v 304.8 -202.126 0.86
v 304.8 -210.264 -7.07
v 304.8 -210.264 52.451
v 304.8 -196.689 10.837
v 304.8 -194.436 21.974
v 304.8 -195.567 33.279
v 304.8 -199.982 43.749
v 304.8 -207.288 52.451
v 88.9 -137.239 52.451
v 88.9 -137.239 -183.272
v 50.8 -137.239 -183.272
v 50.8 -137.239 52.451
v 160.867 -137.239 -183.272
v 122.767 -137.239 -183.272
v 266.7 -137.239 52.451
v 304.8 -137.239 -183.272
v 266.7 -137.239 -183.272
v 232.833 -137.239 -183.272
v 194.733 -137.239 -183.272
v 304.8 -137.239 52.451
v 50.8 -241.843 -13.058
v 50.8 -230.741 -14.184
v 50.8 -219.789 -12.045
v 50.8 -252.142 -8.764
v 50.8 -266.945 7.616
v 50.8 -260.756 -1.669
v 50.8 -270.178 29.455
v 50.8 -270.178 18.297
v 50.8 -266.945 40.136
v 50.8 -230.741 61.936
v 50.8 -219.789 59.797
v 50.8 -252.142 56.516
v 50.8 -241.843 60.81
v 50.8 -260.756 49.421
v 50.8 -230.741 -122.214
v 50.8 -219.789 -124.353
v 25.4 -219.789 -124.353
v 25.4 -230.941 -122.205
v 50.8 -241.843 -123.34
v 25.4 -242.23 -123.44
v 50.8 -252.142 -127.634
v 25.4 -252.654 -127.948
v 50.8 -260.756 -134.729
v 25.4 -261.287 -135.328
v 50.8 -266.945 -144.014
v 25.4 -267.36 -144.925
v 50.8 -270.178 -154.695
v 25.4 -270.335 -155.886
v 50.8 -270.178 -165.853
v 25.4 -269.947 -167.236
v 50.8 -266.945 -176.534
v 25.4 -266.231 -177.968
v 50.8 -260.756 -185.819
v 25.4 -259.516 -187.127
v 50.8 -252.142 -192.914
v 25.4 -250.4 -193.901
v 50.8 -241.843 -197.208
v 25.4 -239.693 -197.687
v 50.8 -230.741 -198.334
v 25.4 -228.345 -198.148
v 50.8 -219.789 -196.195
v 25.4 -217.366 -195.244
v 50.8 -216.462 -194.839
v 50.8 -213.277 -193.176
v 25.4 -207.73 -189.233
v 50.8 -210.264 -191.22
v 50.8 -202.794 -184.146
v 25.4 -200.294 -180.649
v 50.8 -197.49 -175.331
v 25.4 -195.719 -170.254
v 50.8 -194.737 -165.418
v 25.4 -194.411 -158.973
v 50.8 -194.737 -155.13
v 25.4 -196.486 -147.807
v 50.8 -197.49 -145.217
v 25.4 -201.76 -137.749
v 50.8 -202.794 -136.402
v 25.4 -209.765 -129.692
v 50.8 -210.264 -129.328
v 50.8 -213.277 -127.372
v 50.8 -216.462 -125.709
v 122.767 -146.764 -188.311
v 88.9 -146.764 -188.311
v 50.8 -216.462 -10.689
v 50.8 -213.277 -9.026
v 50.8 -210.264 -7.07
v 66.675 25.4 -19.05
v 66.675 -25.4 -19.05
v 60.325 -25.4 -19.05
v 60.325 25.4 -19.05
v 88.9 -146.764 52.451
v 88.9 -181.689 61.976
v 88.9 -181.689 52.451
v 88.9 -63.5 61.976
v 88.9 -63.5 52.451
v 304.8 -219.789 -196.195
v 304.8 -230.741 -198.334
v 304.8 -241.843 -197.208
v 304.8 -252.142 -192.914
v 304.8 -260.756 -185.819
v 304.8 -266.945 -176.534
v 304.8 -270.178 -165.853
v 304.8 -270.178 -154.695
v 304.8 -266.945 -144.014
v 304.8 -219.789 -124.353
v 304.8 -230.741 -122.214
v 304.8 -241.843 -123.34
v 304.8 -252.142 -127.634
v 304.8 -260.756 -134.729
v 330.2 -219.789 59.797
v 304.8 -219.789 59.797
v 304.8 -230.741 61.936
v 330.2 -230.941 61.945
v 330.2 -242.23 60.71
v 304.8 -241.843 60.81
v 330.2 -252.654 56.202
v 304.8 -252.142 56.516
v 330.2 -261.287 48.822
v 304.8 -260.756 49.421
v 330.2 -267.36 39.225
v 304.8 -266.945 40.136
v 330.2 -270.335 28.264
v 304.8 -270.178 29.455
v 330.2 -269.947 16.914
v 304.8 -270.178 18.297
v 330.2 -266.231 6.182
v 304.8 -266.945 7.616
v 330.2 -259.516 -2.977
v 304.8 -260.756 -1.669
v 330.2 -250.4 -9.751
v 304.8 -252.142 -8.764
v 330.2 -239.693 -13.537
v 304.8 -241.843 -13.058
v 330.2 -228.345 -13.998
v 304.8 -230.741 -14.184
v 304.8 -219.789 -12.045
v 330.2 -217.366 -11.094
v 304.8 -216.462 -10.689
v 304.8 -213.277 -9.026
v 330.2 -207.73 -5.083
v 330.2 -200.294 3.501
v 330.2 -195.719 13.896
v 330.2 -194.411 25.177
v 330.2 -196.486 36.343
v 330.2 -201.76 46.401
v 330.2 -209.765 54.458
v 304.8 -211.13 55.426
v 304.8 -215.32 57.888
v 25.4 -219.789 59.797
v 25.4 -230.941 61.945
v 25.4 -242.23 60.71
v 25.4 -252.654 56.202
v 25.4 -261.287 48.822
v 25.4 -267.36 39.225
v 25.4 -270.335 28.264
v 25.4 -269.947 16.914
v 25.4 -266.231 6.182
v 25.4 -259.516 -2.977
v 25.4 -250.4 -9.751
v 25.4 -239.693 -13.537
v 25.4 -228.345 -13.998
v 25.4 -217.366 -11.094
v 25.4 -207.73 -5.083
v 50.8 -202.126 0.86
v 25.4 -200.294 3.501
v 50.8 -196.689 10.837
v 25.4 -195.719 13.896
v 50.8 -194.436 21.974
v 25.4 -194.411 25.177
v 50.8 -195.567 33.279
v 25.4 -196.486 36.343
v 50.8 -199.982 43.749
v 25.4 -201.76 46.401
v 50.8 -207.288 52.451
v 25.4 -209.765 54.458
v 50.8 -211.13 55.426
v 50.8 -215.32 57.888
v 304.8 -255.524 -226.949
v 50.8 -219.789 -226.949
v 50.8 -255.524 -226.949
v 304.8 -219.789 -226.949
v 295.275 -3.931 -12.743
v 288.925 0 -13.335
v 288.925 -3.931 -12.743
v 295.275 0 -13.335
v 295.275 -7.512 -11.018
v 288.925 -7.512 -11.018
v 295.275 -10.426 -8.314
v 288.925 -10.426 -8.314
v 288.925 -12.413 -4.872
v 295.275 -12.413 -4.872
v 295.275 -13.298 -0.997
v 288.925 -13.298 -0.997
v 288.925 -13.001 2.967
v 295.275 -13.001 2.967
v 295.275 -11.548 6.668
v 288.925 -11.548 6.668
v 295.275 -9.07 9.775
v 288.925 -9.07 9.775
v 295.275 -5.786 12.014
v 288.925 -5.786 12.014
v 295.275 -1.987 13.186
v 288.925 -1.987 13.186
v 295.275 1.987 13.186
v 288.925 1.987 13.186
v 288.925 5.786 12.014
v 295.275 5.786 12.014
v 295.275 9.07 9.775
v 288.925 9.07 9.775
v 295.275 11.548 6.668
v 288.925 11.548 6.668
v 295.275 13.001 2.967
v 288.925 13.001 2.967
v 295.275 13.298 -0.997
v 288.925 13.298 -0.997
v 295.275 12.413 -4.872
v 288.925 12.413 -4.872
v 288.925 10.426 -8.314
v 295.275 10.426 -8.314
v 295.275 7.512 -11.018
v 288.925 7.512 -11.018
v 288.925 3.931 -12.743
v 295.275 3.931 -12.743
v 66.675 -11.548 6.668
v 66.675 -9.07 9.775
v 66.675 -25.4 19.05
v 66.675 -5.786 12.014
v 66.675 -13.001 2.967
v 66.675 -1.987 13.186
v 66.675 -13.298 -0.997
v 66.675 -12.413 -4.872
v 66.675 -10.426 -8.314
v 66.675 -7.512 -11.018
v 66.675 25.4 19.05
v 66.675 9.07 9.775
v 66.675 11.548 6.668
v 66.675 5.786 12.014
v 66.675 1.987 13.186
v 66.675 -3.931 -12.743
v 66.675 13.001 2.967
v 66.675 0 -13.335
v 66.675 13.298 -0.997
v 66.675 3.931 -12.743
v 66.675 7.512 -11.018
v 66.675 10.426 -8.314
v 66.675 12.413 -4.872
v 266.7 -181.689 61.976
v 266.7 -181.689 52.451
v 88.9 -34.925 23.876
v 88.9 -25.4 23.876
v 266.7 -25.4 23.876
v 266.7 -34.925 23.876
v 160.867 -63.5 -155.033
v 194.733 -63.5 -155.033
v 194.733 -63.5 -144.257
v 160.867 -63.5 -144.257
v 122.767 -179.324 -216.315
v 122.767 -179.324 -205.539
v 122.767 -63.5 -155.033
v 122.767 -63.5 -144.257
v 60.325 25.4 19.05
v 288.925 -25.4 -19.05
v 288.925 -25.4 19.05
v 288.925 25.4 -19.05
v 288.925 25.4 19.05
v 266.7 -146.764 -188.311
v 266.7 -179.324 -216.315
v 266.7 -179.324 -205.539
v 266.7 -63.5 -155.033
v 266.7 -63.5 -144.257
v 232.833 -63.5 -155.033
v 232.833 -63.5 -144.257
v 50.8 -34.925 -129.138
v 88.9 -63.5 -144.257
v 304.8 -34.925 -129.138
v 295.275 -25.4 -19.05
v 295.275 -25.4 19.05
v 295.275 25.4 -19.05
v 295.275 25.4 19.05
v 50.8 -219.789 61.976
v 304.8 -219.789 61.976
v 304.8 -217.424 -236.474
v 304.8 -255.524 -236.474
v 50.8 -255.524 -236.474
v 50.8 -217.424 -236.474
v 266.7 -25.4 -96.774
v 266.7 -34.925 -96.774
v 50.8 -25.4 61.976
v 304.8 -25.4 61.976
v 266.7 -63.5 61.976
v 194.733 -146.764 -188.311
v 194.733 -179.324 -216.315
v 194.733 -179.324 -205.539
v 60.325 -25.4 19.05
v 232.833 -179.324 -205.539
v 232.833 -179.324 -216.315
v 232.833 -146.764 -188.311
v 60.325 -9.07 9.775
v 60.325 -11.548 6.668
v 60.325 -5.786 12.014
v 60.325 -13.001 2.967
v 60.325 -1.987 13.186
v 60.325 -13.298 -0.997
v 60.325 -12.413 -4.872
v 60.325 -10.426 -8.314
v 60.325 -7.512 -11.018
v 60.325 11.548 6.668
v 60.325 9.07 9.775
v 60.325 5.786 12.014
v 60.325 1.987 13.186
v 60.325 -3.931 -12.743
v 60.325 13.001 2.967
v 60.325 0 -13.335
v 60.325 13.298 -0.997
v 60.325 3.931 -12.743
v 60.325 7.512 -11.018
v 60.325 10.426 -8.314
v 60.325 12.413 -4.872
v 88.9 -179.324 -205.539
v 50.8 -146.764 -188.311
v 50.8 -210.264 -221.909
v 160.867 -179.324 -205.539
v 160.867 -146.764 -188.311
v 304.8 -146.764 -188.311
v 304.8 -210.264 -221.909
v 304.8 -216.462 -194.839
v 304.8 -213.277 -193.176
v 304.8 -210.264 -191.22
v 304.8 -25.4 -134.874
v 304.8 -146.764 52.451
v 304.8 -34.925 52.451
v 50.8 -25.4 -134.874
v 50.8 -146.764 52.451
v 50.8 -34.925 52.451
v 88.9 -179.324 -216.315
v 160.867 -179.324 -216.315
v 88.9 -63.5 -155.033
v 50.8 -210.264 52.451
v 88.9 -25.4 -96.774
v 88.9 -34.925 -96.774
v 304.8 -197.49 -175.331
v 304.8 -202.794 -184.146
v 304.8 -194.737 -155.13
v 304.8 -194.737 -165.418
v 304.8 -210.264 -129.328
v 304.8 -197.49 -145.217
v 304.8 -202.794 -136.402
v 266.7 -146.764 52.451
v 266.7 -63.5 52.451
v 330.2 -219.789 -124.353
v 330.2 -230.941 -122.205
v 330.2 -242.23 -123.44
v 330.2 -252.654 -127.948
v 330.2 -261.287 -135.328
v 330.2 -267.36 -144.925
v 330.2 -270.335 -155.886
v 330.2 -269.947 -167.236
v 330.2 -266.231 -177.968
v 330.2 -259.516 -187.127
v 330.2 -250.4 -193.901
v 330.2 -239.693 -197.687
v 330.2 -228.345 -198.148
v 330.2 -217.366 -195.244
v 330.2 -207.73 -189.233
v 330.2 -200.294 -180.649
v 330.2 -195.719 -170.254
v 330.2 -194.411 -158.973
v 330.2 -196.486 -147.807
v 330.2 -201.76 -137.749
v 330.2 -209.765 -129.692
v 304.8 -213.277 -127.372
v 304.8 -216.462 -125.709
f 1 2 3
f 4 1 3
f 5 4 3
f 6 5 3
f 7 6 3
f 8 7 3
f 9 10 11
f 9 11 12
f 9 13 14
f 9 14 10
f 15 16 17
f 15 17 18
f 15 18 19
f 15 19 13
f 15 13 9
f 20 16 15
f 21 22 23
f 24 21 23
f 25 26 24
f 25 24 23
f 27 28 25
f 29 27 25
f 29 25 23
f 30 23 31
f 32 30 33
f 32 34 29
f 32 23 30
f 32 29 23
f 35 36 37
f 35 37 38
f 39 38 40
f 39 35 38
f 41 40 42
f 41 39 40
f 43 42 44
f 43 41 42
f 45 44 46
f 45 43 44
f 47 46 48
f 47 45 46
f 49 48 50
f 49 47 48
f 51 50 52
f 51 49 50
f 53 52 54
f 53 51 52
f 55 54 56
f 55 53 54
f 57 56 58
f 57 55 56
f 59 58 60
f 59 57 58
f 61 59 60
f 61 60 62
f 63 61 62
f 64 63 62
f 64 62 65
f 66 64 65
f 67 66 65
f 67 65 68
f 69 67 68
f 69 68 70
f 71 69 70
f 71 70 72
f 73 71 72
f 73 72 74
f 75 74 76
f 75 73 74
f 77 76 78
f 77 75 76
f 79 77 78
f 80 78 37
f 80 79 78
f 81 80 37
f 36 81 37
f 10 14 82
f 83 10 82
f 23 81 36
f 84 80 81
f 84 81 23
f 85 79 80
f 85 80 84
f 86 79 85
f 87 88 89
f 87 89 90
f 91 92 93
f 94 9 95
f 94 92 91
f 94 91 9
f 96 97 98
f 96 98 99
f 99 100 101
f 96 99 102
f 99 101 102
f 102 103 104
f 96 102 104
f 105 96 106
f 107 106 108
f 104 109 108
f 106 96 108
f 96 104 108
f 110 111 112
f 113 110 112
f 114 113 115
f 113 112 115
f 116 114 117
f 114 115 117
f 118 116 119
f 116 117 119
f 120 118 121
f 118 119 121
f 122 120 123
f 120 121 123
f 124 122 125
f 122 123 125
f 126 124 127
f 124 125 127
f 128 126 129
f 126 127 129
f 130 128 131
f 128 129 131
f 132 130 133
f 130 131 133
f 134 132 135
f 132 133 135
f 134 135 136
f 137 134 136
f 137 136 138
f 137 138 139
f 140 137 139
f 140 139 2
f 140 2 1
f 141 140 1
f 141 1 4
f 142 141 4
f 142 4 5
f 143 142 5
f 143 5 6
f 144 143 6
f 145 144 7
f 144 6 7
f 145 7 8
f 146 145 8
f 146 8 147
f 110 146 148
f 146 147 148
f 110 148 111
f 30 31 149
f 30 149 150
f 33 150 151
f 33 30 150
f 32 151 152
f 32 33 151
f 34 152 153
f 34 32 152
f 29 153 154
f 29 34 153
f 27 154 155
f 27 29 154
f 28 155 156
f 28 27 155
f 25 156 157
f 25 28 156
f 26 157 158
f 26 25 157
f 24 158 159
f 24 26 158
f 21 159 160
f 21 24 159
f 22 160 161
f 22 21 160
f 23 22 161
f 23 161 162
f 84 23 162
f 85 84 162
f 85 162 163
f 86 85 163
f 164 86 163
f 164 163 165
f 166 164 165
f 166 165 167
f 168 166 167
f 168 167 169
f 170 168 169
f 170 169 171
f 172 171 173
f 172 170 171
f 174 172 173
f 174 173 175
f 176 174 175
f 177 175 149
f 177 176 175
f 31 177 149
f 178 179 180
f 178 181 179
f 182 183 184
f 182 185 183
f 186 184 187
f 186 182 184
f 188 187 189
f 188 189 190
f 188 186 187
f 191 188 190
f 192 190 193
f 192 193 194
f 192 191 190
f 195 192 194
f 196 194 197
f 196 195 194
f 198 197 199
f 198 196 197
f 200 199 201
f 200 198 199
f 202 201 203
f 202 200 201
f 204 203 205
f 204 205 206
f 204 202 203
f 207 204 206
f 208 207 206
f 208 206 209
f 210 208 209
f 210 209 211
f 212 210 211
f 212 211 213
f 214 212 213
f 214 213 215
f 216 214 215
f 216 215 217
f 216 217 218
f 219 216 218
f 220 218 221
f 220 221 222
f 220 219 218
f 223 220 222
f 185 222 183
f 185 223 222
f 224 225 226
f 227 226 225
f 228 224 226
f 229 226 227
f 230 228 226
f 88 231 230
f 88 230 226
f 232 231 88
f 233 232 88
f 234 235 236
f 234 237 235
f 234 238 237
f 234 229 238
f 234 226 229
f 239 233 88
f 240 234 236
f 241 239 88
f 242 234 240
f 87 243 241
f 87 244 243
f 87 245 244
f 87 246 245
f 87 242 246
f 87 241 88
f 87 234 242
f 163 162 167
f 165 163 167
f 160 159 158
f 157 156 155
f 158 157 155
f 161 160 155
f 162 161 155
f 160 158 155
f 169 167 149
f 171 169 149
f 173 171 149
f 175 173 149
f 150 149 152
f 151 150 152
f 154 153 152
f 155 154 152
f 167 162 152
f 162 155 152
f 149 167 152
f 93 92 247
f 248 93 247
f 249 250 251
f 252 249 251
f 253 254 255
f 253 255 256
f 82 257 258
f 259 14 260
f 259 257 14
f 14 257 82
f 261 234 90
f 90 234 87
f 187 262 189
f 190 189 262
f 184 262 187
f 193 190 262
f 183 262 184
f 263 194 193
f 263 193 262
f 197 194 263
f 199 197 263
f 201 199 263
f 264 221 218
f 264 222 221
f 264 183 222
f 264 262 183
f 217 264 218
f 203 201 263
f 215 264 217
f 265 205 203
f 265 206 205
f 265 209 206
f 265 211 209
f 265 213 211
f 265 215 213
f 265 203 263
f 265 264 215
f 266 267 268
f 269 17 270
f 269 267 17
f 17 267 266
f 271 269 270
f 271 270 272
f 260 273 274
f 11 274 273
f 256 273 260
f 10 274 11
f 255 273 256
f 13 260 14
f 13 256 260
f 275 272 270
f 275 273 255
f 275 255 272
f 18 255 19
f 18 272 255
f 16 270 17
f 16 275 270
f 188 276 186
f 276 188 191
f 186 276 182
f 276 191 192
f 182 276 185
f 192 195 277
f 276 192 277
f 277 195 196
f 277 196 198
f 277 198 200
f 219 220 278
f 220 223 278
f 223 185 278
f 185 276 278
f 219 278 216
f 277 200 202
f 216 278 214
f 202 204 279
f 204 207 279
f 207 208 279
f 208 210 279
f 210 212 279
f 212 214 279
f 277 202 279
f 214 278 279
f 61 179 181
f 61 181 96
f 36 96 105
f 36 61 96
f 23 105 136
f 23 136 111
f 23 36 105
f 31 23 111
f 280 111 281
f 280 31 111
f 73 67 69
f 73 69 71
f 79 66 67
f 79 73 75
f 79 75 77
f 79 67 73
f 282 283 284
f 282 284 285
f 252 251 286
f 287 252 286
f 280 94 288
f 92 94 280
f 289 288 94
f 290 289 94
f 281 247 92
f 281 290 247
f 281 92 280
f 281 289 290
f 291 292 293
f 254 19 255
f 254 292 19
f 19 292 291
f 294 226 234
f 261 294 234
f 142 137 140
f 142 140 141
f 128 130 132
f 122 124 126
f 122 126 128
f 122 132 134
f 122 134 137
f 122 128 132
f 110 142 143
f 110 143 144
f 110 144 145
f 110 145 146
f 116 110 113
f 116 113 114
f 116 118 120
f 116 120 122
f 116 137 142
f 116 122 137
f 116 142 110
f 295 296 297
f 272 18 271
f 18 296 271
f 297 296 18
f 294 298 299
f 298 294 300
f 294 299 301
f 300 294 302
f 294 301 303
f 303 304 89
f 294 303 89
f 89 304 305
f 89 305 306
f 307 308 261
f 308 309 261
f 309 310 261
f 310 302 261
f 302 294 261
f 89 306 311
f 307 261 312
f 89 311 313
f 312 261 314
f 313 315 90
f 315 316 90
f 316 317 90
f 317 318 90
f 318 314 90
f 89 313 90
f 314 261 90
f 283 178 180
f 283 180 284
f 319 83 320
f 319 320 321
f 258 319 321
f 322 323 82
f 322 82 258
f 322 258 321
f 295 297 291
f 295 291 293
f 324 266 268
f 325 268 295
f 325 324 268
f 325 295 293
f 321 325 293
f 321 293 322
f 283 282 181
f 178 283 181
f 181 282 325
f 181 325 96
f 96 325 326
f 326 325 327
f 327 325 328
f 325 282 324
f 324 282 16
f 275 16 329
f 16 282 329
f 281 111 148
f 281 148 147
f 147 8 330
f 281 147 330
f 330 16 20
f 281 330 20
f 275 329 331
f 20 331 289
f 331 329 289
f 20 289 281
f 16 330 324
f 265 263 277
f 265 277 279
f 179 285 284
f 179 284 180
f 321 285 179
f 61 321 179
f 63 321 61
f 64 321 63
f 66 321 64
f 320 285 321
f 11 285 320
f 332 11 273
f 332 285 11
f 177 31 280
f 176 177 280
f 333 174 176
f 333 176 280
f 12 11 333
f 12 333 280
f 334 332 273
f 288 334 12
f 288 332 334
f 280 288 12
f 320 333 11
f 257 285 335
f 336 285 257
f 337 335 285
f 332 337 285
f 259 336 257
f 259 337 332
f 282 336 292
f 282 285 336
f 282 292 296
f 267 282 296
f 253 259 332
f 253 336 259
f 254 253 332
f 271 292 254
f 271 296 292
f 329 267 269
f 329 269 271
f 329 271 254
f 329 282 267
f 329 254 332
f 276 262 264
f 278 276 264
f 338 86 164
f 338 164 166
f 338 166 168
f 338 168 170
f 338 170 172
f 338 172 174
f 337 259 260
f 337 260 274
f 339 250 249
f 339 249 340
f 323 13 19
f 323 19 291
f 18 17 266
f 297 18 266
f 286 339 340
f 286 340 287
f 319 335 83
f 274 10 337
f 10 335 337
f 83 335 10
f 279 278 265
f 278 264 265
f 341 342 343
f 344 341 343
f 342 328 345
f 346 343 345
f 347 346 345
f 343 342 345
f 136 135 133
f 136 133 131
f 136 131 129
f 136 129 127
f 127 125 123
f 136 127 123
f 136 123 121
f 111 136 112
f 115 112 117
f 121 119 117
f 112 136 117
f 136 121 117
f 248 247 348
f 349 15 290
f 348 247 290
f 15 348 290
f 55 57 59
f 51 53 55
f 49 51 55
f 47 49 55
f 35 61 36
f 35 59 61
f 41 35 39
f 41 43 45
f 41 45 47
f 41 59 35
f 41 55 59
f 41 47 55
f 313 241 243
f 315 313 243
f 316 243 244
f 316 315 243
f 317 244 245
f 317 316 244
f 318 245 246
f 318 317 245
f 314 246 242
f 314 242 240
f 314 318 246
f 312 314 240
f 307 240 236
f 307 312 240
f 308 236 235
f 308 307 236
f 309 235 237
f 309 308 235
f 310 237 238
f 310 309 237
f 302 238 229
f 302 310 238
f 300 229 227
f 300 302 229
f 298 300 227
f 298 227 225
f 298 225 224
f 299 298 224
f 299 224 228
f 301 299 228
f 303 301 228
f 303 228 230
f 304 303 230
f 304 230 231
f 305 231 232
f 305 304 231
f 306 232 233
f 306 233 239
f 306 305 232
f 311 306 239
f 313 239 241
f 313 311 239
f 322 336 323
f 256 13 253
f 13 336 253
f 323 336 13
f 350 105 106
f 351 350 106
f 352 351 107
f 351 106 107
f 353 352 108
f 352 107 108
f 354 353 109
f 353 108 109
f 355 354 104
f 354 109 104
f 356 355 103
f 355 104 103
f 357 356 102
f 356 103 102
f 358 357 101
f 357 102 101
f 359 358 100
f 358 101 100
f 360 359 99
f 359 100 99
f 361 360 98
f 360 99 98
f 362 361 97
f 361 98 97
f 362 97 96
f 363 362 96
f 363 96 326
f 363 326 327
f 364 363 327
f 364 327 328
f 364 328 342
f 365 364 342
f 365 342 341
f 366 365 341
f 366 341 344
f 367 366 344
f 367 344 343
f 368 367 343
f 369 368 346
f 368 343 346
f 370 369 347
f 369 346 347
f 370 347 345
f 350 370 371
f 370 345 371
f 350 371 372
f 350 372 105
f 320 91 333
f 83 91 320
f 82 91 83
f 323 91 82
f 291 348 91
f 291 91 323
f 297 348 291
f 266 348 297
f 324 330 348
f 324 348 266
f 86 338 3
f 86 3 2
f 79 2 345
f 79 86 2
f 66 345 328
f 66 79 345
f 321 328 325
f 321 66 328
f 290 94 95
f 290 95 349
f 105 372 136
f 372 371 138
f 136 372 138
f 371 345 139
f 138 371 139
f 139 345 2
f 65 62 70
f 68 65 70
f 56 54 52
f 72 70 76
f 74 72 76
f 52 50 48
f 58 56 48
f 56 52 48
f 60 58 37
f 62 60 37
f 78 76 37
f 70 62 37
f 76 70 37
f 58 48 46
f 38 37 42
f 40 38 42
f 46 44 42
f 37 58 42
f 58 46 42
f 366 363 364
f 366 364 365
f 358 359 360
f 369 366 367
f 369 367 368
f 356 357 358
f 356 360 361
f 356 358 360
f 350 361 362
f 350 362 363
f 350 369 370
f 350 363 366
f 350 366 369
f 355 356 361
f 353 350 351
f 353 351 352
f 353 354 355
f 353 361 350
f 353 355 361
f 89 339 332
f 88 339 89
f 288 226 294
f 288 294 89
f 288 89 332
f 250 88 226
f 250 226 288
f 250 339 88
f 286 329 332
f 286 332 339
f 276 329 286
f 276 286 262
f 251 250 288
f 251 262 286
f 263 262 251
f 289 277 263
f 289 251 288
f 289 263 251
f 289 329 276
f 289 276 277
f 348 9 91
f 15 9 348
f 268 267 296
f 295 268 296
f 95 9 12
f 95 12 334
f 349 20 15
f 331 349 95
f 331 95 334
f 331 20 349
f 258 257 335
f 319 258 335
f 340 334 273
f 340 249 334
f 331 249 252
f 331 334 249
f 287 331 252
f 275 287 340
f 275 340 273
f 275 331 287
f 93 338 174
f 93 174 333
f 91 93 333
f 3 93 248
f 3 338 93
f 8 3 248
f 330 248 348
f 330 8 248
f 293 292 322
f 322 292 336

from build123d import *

# Parameters (mm, degrees)
SKETCH2_W           = 38.1
SKETCH2_H           = 50.8
SKETCH2_R           = 13.335
BOSS_EXTRUDE2_DEPTH = 3.175
SKETCH4_W           = 38.1
SKETCH4_H           = 50.8
SKETCH4_R           = 13.335
BOSS_EXTRUDE3_DEPTH = 3.175
BOSS_EXTRUDE4_DEPTH = 127
CUT_EXTRUDE3_DEPTH  = 127
BOSS_EXTRUDE7_DEPTH = 127
SKETCH16_R          = 38.1
BOSS_EXTRUDE8_DEPTH = 25.4
CUT_EXTRUDE6_REACH  = 522.886
SKETCH19_W          = 33.866666667
SKETCH19_H          = 115.824
SKETCH19_W_2        = 33.866666666
SKETCH20_W          = 177.8
SKETCH20_H          = 120.65
CUT_EXTRUDE7_DEPTH  = 34.925
SKETCH22_W          = 177.8
SKETCH22_H          = 118.188552156
CUT_EXTRUDE8_DEPTH  = 9.525


with BuildPart() as part:
    # Sketch2 → Boss-Extrude2 (new, symmetric)
    with BuildSketch(Plane(origin=(63.5, 0, 0), x_dir=(0, 0, -1), z_dir=(1, 0, 0))):
        Rectangle(SKETCH2_W, SKETCH2_H)
        Circle(SKETCH2_R, mode=Mode.SUBTRACT)
    extrude(amount=BOSS_EXTRUDE2_DEPTH, both=True)



with BuildPart() as body_2:
    # Sketch4 → Boss-Extrude3 (new, symmetric)
    with BuildSketch(Plane(origin=(292.1, 0, -263.652), x_dir=(0, 0, 1), z_dir=(-1, 0, 0))):
        with Locations((263.652, 0)):
            Rectangle(SKETCH4_W, SKETCH4_H)
        with Locations(Location((263.652, 0, 0), (0, 0, 180))):
            Circle(SKETCH4_R, mode=Mode.SUBTRACT)
    extrude(amount=BOSS_EXTRUDE3_DEPTH, both=True)


with BuildPart() as part_1:
    add(part.part)

    add(body_2.part)  # Boss-Extrude4 merges body 2
    # Sketch6 → Boss-Extrude4 (add, symmetric)
    with BuildSketch(Plane(origin=(177.8, 0, 0), x_dir=(0, 0, -1), z_dir=(1, 0, 0))):
        Polygon((-19.05, -25.4), (-61.976, -25.4), (-61.976, -255.524), (236.474, -255.524), (236.474, -217.424), (134.874, -25.4), (19.05, -25.4), align=None)
    extrude(amount=BOSS_EXTRUDE4_DEPTH, both=True)

    # Sketch13 → Cut-Extrude3 (cut, symmetric)
    with BuildSketch(Plane(origin=(177.8, 0, 0), x_dir=(0, 0, -1), z_dir=(1, 0, 0))):
        Polygon((-52.451, -34.925), (129.137596743, -34.925), (226.949, -219.788552156), (226.949, -255.524), (-61.976, -255.524), (-61.976, -219.788552156), (-52.451, -219.788552156), align=None)
    extrude(amount=CUT_EXTRUDE3_DEPTH, both=True, mode=Mode.SUBTRACT)

    # Sketch14 → Boss-Extrude7 (add, symmetric)
    with BuildSketch(Plane(origin=(177.8, 0, 0), x_dir=(0, 0, -1), z_dir=(1, 0, 0))):
        Polygon((226.949, -219.788552156), (-52.451, -219.788552156), (-52.451, -210.263552156), (221.90931746, -210.263552156), align=None)
        Polygon((-52.451, -146.763552156), (188.311433862, -146.763552156), (183.271751323, -137.238552156), (-52.451, -137.238552156), align=None)
    extrude(amount=BOSS_EXTRUDE7_DEPTH, both=True)

    # Sketch16 → Boss-Extrude8 (add)
    with BuildSketch(Plane(origin=(304.8, 0, 0), x_dir=(0, 0, -1), z_dir=(1, 0, 0))):
        with Locations(Location((-23.876, -232.488552156, 0), (0, 0, 160.528779366))):
            Circle(SKETCH16_R)
        with Locations(Location((160.274, -232.488552156, 0), (0, 0, 160.528779366))):
            Circle(SKETCH16_R)
    boss_extrude8 = extrude(amount=BOSS_EXTRUDE8_DEPTH)

    # Mirror1: Boss-Extrude8 across plane
    add(boss_extrude8.mirror(Plane(origin=(177.8, 0, 0), x_dir=(0, 0, 1), z_dir=(1, 0, 0))))

    # Cut-Extrude6: up to this plane
    cut_extrude6_end = Plane(origin=(50.8, -34.925, -129.137596743), z_dir=(0, 0.46767282988430103, -0.8839016484813284))
    # Sketch19 → Cut-Extrude6 (cut, up to the surface)
    with BuildSketch(Plane(origin=(0, 0, -236.474), x_dir=(-1, 0, 0), z_dir=(0, 0, -1)), mode=Mode.PRIVATE) as cut_extrude6_sk1:
        with Locations((-249.766666666, -121.412)):
            Rectangle(SKETCH19_W, SKETCH19_H)
    cut_extrude6_tool1 = split(extrude(cut_extrude6_sk1.sketch, amount=-CUT_EXTRUDE6_REACH, mode=Mode.PRIVATE), bisect_by=cut_extrude6_end, keep=Keep.BOTH, mode=Mode.PRIVATE)
    add(cut_extrude6_tool1.solids().sort_by_distance((249.766667, -121.412, -236.474))[0], mode=Mode.SUBTRACT)
    # Sketch19 → Cut-Extrude6 (cut, up to the surface)
    with BuildSketch(Plane(origin=(0, 0, -236.474), x_dir=(-1, 0, 0), z_dir=(0, 0, -1)), mode=Mode.PRIVATE) as cut_extrude6_sk2:
        with Locations((-177.8, -121.412)):
            Rectangle(SKETCH19_W_2, SKETCH19_H)
    cut_extrude6_tool2 = split(extrude(cut_extrude6_sk2.sketch, amount=-CUT_EXTRUDE6_REACH, mode=Mode.PRIVATE), bisect_by=cut_extrude6_end, keep=Keep.BOTH, mode=Mode.PRIVATE)
    add(cut_extrude6_tool2.solids().sort_by_distance((177.8, -121.412, -236.474))[0], mode=Mode.SUBTRACT)
    # Sketch19 → Cut-Extrude6 (cut, up to the surface)
    with BuildSketch(Plane(origin=(0, 0, -236.474), x_dir=(-1, 0, 0), z_dir=(0, 0, -1)), mode=Mode.PRIVATE) as cut_extrude6_sk3:
        with Locations((-105.833333334, -121.412)):
            Rectangle(SKETCH19_W, SKETCH19_H)
    cut_extrude6_tool3 = split(extrude(cut_extrude6_sk3.sketch, amount=-CUT_EXTRUDE6_REACH, mode=Mode.PRIVATE), bisect_by=cut_extrude6_end, keep=Keep.BOTH, mode=Mode.PRIVATE)
    add(cut_extrude6_tool3.solids().sort_by_distance((105.833333, -121.412, -236.474))[0], mode=Mode.SUBTRACT)

    # Sketch20 → Cut-Extrude7 (cut)
    with BuildSketch(Plane(origin=(0, 0, 0), x_dir=(1, 0, 0), z_dir=(0, 1, 0))):
        with Locations((177.8, 36.449)):
            Rectangle(SKETCH20_W, SKETCH20_H)
    extrude(amount=-CUT_EXTRUDE7_DEPTH, mode=Mode.SUBTRACT)

    # Sketch22 → Cut-Extrude8 (cut)
    with BuildSketch(Plane.XY.offset(61.976)):
        with Locations((177.8, -122.594276078)):
            Rectangle(SKETCH22_W, SKETCH22_H)
    extrude(amount=-CUT_EXTRUDE8_DEPTH, mode=Mode.SUBTRACT)


solid = part_1.part
